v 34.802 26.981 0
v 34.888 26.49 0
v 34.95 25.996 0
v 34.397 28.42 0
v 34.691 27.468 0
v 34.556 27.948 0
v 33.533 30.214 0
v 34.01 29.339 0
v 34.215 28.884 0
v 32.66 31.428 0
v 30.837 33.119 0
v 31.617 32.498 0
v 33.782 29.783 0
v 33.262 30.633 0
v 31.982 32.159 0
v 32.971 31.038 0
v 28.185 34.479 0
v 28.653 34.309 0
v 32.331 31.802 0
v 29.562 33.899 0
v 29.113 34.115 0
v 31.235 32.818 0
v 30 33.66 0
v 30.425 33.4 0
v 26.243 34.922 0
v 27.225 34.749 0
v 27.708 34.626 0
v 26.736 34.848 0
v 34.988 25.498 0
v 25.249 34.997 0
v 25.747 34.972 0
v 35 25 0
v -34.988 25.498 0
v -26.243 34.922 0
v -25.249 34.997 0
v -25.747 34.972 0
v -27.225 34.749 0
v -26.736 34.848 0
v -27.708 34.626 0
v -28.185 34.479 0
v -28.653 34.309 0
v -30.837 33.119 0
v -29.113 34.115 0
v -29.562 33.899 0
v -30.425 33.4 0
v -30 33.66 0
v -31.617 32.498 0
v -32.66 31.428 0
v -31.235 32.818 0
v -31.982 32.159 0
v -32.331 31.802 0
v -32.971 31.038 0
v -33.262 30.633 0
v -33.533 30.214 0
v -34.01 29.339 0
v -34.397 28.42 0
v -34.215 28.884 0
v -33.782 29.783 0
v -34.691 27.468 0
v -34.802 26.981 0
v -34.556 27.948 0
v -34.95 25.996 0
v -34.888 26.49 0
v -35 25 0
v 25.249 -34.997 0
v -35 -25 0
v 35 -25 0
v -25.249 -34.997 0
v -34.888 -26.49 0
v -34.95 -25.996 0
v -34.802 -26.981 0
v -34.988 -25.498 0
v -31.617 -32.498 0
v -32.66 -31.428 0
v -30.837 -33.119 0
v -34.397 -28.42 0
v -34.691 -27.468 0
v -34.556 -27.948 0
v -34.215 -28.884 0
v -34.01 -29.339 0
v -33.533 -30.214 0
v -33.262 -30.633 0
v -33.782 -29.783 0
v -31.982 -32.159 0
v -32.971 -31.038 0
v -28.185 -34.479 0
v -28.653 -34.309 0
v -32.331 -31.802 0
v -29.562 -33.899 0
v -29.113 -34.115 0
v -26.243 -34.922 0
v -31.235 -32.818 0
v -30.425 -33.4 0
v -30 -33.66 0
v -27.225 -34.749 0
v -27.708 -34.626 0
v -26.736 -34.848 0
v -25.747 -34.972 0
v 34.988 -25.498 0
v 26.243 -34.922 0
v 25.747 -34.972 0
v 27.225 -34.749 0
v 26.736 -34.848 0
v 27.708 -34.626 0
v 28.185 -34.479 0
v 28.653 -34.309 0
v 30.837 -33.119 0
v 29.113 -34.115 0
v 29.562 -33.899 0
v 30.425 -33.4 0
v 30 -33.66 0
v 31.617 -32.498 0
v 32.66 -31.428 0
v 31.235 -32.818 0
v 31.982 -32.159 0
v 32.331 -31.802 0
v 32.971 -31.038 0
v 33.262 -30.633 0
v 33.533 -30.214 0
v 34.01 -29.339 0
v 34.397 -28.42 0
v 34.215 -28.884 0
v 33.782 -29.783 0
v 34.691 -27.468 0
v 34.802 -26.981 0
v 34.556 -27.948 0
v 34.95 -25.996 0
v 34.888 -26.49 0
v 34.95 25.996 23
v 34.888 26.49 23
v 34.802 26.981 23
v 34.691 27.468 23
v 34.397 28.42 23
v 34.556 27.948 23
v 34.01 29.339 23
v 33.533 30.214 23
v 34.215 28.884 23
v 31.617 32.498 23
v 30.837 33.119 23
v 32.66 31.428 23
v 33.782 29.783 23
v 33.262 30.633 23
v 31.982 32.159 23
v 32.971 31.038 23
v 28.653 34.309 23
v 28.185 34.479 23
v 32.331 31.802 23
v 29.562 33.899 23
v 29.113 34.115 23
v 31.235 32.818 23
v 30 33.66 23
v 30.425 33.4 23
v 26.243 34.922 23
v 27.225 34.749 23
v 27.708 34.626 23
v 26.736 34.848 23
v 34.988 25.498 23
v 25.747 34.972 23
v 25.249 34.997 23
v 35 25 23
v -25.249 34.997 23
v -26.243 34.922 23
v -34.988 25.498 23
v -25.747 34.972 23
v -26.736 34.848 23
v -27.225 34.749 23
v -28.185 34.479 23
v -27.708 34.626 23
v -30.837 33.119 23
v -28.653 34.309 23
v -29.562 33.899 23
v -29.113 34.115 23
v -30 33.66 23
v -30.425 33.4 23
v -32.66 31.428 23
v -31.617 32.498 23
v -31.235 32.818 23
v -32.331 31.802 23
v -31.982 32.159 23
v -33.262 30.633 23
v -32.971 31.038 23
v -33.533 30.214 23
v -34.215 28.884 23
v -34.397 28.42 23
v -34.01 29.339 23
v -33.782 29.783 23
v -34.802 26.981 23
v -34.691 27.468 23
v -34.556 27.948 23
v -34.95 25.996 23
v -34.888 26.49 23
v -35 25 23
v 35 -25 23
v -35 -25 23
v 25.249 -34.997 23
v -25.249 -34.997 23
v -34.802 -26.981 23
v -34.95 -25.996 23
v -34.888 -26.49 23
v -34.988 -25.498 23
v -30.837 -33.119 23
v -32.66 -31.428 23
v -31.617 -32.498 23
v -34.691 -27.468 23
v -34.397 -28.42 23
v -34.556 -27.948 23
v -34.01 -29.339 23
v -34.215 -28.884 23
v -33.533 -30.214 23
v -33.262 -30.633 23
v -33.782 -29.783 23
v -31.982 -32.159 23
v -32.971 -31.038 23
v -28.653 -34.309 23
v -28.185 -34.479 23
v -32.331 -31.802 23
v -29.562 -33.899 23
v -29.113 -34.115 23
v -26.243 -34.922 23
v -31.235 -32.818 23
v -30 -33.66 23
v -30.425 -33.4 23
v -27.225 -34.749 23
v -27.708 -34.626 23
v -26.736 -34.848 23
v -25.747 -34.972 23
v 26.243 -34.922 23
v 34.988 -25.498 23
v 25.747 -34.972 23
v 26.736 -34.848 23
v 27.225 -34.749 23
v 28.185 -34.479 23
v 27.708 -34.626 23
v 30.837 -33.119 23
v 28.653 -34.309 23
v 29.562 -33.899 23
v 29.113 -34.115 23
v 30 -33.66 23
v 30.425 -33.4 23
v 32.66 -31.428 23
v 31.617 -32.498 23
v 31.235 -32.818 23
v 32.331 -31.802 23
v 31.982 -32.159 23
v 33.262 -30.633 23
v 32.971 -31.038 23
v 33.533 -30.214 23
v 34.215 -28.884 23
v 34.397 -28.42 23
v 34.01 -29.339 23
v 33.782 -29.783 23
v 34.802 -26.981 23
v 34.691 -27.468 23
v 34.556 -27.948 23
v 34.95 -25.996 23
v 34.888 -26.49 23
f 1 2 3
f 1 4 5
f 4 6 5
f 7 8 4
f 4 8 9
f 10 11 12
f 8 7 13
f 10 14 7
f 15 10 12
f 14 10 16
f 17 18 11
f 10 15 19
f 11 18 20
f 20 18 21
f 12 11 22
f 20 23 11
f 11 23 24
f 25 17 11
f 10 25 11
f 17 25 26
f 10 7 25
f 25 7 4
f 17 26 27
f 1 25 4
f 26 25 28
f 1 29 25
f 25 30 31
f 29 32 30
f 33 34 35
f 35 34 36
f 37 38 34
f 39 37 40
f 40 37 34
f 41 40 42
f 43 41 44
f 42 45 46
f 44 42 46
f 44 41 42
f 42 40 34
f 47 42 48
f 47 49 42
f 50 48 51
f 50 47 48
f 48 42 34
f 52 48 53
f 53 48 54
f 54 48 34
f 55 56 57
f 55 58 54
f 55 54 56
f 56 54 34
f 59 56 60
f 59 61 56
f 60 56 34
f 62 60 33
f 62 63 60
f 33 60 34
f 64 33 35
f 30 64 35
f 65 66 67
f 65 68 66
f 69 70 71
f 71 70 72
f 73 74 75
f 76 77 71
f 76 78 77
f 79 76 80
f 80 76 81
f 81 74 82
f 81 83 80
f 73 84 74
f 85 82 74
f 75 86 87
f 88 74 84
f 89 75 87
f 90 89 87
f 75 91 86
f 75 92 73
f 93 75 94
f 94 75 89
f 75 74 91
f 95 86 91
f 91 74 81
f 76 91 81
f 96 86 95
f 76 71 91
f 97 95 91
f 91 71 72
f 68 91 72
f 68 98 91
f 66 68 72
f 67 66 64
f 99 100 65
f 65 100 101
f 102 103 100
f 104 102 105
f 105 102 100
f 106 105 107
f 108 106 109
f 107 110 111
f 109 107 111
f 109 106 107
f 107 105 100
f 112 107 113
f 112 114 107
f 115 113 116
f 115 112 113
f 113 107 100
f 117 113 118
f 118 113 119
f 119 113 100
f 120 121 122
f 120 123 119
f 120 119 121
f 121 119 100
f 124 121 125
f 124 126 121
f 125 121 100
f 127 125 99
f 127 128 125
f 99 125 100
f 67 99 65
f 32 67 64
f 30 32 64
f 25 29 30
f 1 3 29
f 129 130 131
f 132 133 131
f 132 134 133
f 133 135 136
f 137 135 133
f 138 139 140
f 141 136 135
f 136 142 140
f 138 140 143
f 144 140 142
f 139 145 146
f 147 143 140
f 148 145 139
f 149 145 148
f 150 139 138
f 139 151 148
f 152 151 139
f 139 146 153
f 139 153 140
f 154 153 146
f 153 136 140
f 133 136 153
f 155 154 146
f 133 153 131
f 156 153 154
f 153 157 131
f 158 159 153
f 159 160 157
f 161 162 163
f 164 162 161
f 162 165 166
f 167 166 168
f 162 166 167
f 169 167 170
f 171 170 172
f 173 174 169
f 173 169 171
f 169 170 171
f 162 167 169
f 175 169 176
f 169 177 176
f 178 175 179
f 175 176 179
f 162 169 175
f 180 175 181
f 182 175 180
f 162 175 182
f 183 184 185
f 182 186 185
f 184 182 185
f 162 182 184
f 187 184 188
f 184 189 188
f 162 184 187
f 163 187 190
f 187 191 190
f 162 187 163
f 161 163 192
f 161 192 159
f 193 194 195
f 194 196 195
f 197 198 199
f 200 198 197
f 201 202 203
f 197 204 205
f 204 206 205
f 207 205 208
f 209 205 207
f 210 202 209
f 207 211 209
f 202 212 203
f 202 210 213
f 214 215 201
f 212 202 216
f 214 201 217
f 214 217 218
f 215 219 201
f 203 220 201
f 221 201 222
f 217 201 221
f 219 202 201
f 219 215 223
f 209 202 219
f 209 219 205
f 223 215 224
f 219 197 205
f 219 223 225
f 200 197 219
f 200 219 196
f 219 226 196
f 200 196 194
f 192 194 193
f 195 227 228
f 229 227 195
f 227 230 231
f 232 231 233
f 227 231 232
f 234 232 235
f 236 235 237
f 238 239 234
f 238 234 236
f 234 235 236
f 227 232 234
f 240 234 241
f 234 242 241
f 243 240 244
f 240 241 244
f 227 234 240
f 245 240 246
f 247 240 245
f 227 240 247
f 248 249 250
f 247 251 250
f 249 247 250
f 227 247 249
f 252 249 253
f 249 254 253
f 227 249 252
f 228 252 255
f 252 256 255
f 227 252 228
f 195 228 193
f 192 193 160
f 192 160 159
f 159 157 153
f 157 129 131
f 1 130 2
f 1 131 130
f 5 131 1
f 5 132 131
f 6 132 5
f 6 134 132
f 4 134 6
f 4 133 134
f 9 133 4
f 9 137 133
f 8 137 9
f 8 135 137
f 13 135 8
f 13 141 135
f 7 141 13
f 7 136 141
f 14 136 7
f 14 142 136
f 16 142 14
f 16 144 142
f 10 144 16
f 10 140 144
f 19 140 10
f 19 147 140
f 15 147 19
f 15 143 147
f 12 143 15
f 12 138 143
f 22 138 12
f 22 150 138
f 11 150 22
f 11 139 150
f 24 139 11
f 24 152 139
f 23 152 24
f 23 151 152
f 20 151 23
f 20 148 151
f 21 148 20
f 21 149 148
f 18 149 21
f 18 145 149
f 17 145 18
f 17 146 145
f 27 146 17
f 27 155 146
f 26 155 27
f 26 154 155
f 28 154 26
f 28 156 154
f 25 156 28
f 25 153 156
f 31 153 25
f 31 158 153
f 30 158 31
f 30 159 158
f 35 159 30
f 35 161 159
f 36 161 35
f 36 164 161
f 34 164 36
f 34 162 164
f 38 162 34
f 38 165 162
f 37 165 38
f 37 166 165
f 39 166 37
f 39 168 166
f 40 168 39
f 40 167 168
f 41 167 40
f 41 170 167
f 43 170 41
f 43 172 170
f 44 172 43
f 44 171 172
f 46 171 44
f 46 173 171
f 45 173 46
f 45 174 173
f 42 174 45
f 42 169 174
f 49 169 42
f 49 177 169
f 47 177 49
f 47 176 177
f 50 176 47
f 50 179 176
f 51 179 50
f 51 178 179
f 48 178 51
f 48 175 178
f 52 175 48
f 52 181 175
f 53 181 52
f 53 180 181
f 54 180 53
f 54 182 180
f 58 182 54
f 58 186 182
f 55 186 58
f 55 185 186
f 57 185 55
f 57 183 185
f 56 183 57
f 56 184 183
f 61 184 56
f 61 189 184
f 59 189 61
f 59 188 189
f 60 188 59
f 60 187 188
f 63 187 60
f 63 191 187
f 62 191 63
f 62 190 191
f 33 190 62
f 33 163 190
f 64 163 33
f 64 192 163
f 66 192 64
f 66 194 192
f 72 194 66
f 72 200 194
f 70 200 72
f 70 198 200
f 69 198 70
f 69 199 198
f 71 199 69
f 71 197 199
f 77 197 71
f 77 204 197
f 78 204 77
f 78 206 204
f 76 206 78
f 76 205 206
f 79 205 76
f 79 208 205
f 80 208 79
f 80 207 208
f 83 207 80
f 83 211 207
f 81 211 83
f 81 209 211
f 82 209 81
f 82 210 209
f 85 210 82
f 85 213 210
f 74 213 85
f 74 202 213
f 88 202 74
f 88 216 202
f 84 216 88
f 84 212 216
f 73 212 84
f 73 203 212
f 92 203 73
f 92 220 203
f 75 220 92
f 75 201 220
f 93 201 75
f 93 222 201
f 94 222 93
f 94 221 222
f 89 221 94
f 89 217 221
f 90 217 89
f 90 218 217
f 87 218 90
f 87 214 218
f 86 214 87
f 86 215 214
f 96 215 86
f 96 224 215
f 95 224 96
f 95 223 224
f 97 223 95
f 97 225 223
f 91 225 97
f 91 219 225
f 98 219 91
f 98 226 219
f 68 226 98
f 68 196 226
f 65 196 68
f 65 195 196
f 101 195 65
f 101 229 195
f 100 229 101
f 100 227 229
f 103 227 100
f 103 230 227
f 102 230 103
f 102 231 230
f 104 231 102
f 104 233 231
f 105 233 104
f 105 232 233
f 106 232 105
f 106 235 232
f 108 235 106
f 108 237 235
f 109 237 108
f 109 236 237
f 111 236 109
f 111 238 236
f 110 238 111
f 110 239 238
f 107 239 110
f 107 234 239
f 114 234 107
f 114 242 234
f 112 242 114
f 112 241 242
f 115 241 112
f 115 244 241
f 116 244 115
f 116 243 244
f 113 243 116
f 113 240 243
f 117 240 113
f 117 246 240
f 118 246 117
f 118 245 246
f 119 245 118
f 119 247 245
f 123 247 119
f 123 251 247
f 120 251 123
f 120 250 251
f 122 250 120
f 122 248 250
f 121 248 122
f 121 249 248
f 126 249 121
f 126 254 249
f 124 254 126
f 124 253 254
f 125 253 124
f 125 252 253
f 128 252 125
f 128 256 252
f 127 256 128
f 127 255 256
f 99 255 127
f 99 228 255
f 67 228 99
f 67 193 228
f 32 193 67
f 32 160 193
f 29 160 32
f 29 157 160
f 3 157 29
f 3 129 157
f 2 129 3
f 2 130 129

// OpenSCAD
$fa=1;$fs=.5;

body_size=[70,70];
body_height=23;
body_r=15;
body_bevel=2;
body_bevel_angle=60;


module rsq(size=[50,50],r=10){
	minkowski(){square([size[0]-2*r,size[1]-2*r],center=true);circle(r=r);}
}
module panel(size=[50,50],r=10,bevel=2,thick=3,bevel_angle=60){
	assert(bevel<=thick);
	assert(bevel<=r);
	minkowski(){
		linear_extrude(max(thick-bevel,.001))square([size[0]-2*r,size[1]-2*r],center=true);
		cylinder(bevel,r-bevel/tan(bevel_angle),r);
	}
}
//panel(body_size,body_r,body_bevel,3,body_bevel_angle);
linear_extrude(body_height)rsq(body_size);
